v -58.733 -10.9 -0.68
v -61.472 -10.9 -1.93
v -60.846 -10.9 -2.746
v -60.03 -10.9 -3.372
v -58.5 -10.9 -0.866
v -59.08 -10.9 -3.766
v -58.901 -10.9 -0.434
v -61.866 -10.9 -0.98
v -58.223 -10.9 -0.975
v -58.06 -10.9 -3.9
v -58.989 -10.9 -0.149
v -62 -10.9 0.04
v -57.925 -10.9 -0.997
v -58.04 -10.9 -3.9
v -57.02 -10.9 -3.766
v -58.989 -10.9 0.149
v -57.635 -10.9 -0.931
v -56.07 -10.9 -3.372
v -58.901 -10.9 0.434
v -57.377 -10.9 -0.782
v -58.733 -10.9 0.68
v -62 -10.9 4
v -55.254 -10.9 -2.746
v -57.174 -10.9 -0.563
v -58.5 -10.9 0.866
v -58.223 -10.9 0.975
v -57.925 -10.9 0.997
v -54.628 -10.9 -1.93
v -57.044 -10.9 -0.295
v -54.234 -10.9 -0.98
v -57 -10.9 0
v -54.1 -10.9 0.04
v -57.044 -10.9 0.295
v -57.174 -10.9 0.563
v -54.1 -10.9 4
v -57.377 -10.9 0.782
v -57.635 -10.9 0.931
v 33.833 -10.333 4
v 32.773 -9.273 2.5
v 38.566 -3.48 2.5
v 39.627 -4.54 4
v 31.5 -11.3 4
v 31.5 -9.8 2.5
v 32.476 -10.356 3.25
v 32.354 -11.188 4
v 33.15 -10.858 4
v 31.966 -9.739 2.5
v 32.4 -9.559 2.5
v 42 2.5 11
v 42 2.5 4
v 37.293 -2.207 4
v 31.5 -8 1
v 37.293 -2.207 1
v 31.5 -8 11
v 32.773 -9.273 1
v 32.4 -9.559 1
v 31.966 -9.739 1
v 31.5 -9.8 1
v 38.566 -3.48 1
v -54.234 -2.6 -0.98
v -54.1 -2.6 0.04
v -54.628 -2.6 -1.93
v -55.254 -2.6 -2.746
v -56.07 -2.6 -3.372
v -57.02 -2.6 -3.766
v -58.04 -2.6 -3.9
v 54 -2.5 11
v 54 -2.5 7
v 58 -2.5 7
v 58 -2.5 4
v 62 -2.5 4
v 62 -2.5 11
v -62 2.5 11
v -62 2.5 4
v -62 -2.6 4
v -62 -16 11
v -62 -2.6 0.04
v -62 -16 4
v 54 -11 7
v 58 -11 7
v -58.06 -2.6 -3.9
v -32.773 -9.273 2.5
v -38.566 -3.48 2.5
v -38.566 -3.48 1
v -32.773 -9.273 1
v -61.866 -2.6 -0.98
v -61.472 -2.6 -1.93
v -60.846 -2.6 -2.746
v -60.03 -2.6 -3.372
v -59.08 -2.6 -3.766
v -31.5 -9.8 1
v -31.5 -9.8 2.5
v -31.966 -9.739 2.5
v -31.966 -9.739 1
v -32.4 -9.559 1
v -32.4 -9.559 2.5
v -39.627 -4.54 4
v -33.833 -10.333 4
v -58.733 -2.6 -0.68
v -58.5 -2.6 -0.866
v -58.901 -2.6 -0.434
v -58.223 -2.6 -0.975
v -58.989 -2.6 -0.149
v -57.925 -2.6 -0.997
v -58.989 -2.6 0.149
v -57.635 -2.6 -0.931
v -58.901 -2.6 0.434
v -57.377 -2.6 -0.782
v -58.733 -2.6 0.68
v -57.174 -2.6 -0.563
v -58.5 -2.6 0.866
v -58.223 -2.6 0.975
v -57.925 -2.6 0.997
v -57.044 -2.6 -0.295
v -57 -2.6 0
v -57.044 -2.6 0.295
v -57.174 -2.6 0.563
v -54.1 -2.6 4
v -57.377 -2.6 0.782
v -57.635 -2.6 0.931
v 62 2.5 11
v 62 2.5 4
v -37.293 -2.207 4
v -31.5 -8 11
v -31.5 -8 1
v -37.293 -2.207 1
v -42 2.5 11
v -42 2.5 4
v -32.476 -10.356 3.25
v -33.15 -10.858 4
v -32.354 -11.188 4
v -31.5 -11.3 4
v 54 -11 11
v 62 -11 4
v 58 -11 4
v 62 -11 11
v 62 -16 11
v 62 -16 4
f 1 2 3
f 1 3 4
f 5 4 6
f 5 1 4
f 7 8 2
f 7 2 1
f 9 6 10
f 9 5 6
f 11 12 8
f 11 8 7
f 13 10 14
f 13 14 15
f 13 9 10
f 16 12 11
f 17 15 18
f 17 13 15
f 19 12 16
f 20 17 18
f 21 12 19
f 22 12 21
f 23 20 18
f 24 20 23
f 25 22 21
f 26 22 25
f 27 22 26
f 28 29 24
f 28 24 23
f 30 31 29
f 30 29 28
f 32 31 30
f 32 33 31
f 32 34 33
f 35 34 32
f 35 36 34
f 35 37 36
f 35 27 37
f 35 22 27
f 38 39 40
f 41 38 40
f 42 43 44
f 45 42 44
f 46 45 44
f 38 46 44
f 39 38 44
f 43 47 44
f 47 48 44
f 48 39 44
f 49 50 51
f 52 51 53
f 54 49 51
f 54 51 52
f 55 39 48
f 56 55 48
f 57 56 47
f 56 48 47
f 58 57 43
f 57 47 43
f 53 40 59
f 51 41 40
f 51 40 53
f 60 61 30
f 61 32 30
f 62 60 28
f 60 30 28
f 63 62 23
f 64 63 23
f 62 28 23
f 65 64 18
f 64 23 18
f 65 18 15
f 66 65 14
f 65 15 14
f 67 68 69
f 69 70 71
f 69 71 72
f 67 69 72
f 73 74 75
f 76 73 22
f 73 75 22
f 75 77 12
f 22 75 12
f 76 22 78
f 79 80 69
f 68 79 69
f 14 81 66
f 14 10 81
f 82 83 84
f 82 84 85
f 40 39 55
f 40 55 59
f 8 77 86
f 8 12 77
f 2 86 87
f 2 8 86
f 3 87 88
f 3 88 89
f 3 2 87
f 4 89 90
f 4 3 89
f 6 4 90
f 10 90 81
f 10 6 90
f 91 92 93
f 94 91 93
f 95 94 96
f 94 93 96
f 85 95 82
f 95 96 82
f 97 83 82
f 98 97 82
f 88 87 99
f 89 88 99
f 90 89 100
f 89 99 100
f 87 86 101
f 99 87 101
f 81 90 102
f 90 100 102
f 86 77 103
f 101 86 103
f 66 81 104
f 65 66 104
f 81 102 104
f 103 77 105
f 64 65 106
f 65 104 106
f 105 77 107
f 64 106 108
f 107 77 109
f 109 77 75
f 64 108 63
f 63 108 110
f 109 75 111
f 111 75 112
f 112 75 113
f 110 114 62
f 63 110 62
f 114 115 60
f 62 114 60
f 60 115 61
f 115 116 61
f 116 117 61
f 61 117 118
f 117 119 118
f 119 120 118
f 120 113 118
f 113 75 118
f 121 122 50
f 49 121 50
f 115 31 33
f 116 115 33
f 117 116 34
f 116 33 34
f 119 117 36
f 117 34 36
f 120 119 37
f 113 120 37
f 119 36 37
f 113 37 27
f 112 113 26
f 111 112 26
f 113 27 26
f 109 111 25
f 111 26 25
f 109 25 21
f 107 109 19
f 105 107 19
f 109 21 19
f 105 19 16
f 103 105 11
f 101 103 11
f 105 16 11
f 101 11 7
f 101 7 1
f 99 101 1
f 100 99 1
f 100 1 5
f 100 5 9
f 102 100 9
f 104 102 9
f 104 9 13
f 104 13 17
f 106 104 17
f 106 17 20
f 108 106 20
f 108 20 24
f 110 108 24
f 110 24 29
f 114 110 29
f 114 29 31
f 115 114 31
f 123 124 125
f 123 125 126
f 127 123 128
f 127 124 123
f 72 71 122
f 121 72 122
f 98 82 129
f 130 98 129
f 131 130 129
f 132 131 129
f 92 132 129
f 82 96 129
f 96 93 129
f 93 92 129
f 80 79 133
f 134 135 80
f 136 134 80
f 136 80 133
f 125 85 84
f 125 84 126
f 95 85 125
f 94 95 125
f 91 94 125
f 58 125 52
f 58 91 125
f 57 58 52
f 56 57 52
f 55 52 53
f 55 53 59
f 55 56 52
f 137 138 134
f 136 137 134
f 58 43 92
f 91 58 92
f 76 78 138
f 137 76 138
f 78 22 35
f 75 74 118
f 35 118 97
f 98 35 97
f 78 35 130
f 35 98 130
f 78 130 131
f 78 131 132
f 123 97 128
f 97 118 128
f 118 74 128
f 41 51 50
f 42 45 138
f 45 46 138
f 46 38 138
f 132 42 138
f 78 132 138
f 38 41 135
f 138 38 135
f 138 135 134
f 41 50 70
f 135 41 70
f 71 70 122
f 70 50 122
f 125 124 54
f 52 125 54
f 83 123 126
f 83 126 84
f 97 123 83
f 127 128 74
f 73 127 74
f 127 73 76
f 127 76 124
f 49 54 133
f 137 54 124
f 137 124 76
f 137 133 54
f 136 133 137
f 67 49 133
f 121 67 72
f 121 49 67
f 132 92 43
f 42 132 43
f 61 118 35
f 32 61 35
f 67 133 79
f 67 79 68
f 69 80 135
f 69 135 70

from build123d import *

# Parameters (mm, degrees)
PAD002_DEPTH    = 7
PAD003_DEPTH    = 3
CHAMFER003_SIZE = 1.5
SKETCH009_W     = 7.9
SKETCH009_H     = 8.3
PAD004_DEPTH    = 7.9
FILLET001_R     = 3.94
SKETCH010_R     = 1
HOLE002_DEPTH   = 25
SKETCH016_W     = 8.5
SKETCH016_H     = 7
POCKET003_DEPTH = 4
SKETCH017_W     = 8.5
SKETCH017_H     = 4
POCKET004_DEPTH = 4


with BuildPart() as part:
    # Sketch006 → Pad002 (new body)
    with BuildSketch(Plane.XY.offset(4)):
        Polygon((-62, 2.5), (-62, -16), (62, -16), (62, 2.5), (42, 2.5), (31.5, -8), (-31.5, -8), (-42, 2.5), align=None)
    extrude(amount=PAD002_DEPTH)

    # Sketch007 (on Face9 of Pad002) → Pad003 (join)
    with BuildSketch(Plane(origin=(0, 0, 4), x_dir=(1, 0, 0), z_dir=(0, 0, -1))):
        with BuildLine():
            Line((-31.5, 8), (31.5, 8))
            Line((37.293259, 2.206741), (31.5, 8))
            Line((38.566051, 3.479533), (37.293259, 2.206741))
            Line((32.772792, 9.272792), (38.566051, 3.479533))
            ThreePointArc((32.772792, 9.272792), (32.18883, 9.662983), (31.5, 9.8))
            Line((31.5, 9.8), (-31.5, 9.8))
            ThreePointArc((-31.5, 9.8), (-32.18883, 9.662983), (-32.772792, 9.272792))
            Line((-38.566051, 3.479533), (-32.772792, 9.272792))
            Line((-37.293259, 2.206741), (-38.566051, 3.479533))
            Line((-31.5, 8), (-37.293259, 2.206741))
        make_face()
    extrude(amount=PAD003_DEPTH)

    # Chamfer003
    chamfer003_edges = [part.edges().sort_by_distance(p)[0] for p in [
        (-35.669422, -6.376163, 4),
    ]]
    chamfer(chamfer003_edges, length=CHAMFER003_SIZE)

    # Sketch009 (on Face1 of Chamfer003) → Pad004 (join)
    with BuildSketch(Plane(origin=(0, 0, 4), x_dir=(1, 0, 0), z_dir=(0, 0, -1))):
        with Locations((-58.05, 6.75)):
            Rectangle(SKETCH009_W, SKETCH009_H)
    extrude(amount=PAD004_DEPTH)

    # Fillet001
    fillet001_edges = [part.edges().sort_by_distance(p)[0] for p in [
        (-54.1, -6.75, -3.9),
        (-62, -6.75, -3.9),
    ]]
    fillet(fillet001_edges, radius=FILLET001_R)

    # Sketch010 (on Face1 of Fillet001) → Hole002 (cut)
    with BuildSketch(Plane.XZ.offset(10.9)):
        with Locations((-58, 0)):
            Circle(SKETCH010_R)
    extrude(amount=-HOLE002_DEPTH, mode=Mode.SUBTRACT)

    # Sketch016 (on Face19 of Hole002) → Pocket003 (cut)
    with BuildSketch(Plane.YZ.offset(62)):
        with Locations((-6.75, 7.5)):
            Rectangle(SKETCH016_W, SKETCH016_H)
    extrude(amount=-POCKET003_DEPTH, mode=Mode.SUBTRACT)

    # Sketch017 (on Face21 of Pocket003) → Pocket004 (cut)
    with BuildSketch(Plane.YZ.offset(58)):
        with Locations((-6.75, 9)):
            Rectangle(SKETCH017_W, SKETCH017_H)
    extrude(amount=-POCKET004_DEPTH, mode=Mode.SUBTRACT)


solid = part.part
